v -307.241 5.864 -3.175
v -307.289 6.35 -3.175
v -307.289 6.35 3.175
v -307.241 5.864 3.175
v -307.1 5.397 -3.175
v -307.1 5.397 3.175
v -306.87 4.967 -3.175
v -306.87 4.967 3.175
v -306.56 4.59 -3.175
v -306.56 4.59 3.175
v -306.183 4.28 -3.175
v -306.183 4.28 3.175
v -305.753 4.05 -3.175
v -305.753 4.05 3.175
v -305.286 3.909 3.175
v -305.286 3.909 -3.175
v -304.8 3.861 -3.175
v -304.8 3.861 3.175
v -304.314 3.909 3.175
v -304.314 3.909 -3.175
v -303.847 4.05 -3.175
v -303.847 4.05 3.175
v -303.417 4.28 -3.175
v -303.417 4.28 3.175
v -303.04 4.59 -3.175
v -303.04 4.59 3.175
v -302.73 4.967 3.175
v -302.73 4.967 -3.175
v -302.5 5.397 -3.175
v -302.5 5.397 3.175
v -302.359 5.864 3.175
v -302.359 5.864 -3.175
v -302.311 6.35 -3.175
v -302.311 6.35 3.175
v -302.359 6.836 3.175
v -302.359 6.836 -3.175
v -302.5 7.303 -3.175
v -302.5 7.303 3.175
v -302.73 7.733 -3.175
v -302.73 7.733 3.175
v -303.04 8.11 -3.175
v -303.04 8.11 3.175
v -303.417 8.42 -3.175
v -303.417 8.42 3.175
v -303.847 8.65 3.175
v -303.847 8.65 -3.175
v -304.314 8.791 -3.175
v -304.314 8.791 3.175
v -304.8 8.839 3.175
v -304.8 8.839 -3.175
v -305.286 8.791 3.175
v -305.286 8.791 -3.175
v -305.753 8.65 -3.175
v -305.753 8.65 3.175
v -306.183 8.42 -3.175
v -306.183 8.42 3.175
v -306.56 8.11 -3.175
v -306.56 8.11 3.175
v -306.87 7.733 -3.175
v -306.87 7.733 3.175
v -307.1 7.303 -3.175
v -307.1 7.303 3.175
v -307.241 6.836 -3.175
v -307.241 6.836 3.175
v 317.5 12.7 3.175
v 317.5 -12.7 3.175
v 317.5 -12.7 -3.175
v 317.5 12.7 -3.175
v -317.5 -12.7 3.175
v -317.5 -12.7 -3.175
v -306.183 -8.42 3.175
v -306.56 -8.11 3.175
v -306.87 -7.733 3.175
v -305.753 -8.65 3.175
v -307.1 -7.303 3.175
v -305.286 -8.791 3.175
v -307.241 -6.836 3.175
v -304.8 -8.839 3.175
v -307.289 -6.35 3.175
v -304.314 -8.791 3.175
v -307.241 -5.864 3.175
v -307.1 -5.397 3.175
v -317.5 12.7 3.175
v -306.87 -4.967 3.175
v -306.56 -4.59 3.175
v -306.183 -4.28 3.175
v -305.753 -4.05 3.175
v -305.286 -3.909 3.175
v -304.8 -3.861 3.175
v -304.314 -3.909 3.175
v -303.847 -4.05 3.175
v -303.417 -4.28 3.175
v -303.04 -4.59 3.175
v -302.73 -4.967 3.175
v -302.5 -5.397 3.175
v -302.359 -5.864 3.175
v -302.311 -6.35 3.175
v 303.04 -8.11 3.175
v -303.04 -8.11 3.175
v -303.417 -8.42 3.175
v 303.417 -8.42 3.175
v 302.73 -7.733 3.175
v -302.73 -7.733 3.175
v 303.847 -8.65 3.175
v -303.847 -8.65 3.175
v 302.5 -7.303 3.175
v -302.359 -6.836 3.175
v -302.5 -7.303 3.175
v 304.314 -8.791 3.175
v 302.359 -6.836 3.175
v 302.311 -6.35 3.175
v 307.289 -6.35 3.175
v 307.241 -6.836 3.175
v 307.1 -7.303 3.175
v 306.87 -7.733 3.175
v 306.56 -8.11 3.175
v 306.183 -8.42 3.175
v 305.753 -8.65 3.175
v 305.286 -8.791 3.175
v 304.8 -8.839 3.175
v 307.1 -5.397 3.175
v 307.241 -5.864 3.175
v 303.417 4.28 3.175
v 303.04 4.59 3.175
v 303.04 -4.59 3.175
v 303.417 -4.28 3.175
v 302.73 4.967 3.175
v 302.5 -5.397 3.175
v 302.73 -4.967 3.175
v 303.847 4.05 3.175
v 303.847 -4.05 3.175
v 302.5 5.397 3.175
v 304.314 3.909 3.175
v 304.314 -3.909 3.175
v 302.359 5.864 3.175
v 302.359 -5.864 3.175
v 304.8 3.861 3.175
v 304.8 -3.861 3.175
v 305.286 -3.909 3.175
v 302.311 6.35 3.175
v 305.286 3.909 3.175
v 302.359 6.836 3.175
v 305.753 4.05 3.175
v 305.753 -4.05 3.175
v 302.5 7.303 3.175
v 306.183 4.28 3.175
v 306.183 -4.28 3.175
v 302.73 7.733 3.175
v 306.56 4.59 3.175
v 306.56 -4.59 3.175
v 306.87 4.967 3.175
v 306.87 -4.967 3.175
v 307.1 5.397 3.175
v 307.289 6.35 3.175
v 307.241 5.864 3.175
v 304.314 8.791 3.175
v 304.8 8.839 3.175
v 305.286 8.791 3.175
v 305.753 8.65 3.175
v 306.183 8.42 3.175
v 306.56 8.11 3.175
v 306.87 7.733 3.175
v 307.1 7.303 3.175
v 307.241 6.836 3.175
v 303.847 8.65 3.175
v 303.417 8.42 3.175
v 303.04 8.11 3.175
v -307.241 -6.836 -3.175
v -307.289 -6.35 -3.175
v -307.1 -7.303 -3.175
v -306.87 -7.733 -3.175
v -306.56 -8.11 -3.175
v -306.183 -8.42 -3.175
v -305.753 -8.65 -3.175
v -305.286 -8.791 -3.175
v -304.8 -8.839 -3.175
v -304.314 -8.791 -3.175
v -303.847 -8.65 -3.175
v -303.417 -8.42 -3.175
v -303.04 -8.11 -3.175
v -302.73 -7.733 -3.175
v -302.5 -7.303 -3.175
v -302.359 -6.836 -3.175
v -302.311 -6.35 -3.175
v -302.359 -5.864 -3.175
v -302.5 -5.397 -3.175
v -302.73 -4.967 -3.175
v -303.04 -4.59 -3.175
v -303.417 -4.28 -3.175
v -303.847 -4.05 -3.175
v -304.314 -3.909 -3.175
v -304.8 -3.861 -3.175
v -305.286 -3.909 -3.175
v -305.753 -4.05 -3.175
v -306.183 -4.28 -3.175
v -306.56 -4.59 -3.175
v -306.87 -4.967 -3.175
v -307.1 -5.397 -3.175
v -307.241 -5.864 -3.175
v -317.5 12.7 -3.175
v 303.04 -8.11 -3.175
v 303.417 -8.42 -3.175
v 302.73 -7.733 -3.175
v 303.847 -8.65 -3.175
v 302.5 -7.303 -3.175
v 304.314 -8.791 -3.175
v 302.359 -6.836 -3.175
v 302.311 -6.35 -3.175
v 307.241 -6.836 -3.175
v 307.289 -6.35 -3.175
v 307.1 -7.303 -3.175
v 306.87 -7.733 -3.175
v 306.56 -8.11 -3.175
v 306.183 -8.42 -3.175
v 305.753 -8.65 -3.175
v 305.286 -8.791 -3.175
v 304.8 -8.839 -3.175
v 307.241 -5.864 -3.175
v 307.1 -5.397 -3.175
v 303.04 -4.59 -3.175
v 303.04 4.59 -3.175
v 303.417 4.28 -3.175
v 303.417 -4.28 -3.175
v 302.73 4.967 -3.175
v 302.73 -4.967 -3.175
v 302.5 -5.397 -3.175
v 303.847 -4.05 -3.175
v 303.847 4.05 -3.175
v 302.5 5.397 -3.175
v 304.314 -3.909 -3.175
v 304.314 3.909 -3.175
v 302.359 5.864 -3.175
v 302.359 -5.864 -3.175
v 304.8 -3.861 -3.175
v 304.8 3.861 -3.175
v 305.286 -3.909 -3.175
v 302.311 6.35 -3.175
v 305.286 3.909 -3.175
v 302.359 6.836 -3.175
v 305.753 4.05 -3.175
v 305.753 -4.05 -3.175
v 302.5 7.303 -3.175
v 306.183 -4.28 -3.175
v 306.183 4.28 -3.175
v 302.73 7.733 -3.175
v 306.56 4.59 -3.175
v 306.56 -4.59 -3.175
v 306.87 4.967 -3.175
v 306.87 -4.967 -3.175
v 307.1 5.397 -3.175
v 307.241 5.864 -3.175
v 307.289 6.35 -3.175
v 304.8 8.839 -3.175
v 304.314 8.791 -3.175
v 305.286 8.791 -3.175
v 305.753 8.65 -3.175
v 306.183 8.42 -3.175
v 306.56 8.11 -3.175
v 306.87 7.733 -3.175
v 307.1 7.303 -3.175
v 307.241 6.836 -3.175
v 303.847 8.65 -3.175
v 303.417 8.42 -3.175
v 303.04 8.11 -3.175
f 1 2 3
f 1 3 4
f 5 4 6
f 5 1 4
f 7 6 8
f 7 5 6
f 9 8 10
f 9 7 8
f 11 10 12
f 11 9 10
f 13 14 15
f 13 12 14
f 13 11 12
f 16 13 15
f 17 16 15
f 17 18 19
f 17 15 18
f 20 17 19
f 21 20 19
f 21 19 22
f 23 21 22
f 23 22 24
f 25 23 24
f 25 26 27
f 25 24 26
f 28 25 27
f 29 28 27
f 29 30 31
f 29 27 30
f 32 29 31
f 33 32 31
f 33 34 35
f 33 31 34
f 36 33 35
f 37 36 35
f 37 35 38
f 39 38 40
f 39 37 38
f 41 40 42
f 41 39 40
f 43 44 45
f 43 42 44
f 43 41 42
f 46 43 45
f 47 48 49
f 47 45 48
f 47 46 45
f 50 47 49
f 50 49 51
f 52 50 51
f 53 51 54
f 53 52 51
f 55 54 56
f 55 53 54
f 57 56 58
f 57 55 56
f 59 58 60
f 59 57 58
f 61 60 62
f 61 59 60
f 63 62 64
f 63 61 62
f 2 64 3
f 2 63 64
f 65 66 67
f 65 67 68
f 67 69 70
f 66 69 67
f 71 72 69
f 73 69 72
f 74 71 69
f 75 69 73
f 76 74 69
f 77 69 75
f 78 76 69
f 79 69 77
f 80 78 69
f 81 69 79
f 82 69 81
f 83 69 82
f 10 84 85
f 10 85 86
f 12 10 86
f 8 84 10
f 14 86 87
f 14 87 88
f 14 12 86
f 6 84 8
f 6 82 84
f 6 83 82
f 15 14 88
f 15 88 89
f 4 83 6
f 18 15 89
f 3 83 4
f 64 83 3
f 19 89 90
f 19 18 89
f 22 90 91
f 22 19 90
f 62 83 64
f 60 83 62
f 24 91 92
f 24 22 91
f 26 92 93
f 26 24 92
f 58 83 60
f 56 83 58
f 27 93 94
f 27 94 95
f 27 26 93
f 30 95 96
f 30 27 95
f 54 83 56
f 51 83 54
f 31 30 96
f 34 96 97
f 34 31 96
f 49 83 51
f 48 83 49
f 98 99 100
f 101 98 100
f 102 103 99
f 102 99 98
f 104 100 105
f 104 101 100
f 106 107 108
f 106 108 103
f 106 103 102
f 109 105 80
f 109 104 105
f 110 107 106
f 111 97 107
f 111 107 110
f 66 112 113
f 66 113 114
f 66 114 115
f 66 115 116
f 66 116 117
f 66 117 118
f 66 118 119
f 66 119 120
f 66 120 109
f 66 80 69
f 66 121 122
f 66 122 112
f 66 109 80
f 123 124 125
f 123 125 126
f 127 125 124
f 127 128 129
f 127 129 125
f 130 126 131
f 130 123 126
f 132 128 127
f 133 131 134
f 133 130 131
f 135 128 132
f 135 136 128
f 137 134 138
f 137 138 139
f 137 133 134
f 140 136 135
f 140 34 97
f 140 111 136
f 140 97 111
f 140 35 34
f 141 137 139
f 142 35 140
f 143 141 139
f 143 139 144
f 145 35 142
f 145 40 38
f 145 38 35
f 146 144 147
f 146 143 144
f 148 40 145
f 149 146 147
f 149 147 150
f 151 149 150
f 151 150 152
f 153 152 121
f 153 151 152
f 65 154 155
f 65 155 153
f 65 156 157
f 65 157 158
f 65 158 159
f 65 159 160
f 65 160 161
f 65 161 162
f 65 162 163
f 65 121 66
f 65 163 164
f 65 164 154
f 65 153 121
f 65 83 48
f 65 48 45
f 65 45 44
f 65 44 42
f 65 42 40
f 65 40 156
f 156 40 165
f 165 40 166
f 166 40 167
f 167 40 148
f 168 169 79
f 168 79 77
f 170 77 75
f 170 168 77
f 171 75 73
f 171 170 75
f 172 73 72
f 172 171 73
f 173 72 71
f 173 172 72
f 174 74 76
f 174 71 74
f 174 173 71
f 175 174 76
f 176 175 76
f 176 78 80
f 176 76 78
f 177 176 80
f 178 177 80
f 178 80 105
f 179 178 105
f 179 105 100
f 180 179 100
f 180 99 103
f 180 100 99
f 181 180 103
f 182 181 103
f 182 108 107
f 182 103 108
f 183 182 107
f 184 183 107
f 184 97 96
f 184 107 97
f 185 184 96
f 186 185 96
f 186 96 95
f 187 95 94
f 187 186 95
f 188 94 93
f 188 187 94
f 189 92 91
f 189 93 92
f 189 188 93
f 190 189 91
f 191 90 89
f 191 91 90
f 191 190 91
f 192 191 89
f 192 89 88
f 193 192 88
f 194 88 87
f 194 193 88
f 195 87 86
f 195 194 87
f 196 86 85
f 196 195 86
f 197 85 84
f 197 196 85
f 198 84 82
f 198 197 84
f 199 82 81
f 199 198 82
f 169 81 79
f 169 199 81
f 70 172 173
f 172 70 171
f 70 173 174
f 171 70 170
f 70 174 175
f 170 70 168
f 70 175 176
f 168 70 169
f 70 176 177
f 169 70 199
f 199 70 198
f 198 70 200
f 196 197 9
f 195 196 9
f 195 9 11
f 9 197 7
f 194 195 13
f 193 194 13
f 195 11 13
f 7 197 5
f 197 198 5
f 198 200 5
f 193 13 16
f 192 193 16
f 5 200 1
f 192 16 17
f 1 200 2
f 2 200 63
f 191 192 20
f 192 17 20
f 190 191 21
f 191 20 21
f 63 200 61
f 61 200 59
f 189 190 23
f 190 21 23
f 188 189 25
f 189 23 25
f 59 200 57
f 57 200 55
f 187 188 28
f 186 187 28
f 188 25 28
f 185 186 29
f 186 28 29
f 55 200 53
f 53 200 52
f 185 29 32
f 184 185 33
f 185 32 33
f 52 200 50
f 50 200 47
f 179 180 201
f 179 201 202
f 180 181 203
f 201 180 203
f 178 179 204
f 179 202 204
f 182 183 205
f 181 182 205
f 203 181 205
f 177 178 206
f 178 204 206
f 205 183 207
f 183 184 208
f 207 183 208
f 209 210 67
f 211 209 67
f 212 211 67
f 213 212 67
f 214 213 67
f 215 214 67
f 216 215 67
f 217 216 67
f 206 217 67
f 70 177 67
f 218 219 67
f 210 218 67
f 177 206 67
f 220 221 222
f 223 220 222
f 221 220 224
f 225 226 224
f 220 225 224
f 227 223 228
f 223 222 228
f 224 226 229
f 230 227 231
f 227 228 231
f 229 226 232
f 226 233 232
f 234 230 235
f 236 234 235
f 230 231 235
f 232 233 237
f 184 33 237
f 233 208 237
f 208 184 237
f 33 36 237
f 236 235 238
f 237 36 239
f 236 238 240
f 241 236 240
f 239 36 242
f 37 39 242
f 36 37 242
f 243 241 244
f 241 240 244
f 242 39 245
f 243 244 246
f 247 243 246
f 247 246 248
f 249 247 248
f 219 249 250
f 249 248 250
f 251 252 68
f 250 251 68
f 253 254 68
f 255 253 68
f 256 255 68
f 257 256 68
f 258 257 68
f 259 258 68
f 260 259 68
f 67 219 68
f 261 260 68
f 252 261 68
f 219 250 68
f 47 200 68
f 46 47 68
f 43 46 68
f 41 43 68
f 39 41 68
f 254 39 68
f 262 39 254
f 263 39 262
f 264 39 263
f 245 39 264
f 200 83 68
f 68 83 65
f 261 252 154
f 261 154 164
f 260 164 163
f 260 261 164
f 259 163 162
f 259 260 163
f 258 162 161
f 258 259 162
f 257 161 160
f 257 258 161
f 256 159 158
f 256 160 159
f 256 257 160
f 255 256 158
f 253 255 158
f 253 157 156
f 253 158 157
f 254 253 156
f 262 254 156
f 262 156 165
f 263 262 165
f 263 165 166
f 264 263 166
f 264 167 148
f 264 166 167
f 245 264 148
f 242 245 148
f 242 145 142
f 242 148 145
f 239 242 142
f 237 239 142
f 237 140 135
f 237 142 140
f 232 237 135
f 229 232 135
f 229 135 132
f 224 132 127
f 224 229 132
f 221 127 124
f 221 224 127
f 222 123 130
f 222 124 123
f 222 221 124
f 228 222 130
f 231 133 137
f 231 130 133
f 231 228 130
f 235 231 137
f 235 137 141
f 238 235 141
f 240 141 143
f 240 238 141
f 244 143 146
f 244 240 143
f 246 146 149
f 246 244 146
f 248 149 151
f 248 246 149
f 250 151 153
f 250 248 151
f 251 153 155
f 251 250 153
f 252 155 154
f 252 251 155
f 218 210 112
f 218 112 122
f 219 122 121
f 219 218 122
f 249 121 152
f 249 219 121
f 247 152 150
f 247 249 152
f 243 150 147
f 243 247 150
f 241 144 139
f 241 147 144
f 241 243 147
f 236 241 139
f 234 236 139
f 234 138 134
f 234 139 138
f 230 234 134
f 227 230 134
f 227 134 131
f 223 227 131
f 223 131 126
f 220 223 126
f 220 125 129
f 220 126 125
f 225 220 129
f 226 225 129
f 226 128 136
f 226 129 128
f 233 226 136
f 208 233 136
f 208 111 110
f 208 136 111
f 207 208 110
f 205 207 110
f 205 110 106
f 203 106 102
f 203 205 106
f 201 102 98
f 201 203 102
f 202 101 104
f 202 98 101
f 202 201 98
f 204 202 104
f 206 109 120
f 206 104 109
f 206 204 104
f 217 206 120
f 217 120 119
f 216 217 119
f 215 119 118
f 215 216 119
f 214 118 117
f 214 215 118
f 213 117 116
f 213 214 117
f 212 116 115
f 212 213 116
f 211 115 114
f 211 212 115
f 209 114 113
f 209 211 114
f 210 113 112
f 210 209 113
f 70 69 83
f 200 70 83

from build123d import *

# Parameters (mm, degrees)
SKETCH1_W               = 635
SKETCH1_H               = 25.4
BOSS_EXTRUDE1_DEPTH     = 3.175
CUT_EXTRUDE1_DEPTH      = 318.769760401
CUT_EXTRUDE1_DEPTH_BACK = 318.769760401
SKETCH2_R               = 2.4892


with BuildPart() as part:
    # Sketch1 → Boss-Extrude1 (new, symmetric)
    with BuildSketch(Plane.XY):
        Rectangle(SKETCH1_W, SKETCH1_H)
    extrude(amount=BOSS_EXTRUDE1_DEPTH, both=True)

    # Sketch2 → Cut-Extrude1 (cut, two sides: drawn at the far end of the back side and taken through both)
    with BuildSketch(Plane.XY.offset(-CUT_EXTRUDE1_DEPTH_BACK)):
        with Locations((304.8, -6.35)):
            Circle(SKETCH2_R)
        with Locations((304.8, 6.35)):
            Circle(SKETCH2_R)
        with Locations(Location((-304.8, 6.35, 0), (0, 0, 180))):
            Circle(SKETCH2_R)
        with Locations(Location((-304.8, -6.35, 0), (0, 0, 180))):
            Circle(SKETCH2_R)
    extrude(amount=CUT_EXTRUDE1_DEPTH + CUT_EXTRUDE1_DEPTH_BACK, mode=Mode.SUBTRACT)


solid = part.part
